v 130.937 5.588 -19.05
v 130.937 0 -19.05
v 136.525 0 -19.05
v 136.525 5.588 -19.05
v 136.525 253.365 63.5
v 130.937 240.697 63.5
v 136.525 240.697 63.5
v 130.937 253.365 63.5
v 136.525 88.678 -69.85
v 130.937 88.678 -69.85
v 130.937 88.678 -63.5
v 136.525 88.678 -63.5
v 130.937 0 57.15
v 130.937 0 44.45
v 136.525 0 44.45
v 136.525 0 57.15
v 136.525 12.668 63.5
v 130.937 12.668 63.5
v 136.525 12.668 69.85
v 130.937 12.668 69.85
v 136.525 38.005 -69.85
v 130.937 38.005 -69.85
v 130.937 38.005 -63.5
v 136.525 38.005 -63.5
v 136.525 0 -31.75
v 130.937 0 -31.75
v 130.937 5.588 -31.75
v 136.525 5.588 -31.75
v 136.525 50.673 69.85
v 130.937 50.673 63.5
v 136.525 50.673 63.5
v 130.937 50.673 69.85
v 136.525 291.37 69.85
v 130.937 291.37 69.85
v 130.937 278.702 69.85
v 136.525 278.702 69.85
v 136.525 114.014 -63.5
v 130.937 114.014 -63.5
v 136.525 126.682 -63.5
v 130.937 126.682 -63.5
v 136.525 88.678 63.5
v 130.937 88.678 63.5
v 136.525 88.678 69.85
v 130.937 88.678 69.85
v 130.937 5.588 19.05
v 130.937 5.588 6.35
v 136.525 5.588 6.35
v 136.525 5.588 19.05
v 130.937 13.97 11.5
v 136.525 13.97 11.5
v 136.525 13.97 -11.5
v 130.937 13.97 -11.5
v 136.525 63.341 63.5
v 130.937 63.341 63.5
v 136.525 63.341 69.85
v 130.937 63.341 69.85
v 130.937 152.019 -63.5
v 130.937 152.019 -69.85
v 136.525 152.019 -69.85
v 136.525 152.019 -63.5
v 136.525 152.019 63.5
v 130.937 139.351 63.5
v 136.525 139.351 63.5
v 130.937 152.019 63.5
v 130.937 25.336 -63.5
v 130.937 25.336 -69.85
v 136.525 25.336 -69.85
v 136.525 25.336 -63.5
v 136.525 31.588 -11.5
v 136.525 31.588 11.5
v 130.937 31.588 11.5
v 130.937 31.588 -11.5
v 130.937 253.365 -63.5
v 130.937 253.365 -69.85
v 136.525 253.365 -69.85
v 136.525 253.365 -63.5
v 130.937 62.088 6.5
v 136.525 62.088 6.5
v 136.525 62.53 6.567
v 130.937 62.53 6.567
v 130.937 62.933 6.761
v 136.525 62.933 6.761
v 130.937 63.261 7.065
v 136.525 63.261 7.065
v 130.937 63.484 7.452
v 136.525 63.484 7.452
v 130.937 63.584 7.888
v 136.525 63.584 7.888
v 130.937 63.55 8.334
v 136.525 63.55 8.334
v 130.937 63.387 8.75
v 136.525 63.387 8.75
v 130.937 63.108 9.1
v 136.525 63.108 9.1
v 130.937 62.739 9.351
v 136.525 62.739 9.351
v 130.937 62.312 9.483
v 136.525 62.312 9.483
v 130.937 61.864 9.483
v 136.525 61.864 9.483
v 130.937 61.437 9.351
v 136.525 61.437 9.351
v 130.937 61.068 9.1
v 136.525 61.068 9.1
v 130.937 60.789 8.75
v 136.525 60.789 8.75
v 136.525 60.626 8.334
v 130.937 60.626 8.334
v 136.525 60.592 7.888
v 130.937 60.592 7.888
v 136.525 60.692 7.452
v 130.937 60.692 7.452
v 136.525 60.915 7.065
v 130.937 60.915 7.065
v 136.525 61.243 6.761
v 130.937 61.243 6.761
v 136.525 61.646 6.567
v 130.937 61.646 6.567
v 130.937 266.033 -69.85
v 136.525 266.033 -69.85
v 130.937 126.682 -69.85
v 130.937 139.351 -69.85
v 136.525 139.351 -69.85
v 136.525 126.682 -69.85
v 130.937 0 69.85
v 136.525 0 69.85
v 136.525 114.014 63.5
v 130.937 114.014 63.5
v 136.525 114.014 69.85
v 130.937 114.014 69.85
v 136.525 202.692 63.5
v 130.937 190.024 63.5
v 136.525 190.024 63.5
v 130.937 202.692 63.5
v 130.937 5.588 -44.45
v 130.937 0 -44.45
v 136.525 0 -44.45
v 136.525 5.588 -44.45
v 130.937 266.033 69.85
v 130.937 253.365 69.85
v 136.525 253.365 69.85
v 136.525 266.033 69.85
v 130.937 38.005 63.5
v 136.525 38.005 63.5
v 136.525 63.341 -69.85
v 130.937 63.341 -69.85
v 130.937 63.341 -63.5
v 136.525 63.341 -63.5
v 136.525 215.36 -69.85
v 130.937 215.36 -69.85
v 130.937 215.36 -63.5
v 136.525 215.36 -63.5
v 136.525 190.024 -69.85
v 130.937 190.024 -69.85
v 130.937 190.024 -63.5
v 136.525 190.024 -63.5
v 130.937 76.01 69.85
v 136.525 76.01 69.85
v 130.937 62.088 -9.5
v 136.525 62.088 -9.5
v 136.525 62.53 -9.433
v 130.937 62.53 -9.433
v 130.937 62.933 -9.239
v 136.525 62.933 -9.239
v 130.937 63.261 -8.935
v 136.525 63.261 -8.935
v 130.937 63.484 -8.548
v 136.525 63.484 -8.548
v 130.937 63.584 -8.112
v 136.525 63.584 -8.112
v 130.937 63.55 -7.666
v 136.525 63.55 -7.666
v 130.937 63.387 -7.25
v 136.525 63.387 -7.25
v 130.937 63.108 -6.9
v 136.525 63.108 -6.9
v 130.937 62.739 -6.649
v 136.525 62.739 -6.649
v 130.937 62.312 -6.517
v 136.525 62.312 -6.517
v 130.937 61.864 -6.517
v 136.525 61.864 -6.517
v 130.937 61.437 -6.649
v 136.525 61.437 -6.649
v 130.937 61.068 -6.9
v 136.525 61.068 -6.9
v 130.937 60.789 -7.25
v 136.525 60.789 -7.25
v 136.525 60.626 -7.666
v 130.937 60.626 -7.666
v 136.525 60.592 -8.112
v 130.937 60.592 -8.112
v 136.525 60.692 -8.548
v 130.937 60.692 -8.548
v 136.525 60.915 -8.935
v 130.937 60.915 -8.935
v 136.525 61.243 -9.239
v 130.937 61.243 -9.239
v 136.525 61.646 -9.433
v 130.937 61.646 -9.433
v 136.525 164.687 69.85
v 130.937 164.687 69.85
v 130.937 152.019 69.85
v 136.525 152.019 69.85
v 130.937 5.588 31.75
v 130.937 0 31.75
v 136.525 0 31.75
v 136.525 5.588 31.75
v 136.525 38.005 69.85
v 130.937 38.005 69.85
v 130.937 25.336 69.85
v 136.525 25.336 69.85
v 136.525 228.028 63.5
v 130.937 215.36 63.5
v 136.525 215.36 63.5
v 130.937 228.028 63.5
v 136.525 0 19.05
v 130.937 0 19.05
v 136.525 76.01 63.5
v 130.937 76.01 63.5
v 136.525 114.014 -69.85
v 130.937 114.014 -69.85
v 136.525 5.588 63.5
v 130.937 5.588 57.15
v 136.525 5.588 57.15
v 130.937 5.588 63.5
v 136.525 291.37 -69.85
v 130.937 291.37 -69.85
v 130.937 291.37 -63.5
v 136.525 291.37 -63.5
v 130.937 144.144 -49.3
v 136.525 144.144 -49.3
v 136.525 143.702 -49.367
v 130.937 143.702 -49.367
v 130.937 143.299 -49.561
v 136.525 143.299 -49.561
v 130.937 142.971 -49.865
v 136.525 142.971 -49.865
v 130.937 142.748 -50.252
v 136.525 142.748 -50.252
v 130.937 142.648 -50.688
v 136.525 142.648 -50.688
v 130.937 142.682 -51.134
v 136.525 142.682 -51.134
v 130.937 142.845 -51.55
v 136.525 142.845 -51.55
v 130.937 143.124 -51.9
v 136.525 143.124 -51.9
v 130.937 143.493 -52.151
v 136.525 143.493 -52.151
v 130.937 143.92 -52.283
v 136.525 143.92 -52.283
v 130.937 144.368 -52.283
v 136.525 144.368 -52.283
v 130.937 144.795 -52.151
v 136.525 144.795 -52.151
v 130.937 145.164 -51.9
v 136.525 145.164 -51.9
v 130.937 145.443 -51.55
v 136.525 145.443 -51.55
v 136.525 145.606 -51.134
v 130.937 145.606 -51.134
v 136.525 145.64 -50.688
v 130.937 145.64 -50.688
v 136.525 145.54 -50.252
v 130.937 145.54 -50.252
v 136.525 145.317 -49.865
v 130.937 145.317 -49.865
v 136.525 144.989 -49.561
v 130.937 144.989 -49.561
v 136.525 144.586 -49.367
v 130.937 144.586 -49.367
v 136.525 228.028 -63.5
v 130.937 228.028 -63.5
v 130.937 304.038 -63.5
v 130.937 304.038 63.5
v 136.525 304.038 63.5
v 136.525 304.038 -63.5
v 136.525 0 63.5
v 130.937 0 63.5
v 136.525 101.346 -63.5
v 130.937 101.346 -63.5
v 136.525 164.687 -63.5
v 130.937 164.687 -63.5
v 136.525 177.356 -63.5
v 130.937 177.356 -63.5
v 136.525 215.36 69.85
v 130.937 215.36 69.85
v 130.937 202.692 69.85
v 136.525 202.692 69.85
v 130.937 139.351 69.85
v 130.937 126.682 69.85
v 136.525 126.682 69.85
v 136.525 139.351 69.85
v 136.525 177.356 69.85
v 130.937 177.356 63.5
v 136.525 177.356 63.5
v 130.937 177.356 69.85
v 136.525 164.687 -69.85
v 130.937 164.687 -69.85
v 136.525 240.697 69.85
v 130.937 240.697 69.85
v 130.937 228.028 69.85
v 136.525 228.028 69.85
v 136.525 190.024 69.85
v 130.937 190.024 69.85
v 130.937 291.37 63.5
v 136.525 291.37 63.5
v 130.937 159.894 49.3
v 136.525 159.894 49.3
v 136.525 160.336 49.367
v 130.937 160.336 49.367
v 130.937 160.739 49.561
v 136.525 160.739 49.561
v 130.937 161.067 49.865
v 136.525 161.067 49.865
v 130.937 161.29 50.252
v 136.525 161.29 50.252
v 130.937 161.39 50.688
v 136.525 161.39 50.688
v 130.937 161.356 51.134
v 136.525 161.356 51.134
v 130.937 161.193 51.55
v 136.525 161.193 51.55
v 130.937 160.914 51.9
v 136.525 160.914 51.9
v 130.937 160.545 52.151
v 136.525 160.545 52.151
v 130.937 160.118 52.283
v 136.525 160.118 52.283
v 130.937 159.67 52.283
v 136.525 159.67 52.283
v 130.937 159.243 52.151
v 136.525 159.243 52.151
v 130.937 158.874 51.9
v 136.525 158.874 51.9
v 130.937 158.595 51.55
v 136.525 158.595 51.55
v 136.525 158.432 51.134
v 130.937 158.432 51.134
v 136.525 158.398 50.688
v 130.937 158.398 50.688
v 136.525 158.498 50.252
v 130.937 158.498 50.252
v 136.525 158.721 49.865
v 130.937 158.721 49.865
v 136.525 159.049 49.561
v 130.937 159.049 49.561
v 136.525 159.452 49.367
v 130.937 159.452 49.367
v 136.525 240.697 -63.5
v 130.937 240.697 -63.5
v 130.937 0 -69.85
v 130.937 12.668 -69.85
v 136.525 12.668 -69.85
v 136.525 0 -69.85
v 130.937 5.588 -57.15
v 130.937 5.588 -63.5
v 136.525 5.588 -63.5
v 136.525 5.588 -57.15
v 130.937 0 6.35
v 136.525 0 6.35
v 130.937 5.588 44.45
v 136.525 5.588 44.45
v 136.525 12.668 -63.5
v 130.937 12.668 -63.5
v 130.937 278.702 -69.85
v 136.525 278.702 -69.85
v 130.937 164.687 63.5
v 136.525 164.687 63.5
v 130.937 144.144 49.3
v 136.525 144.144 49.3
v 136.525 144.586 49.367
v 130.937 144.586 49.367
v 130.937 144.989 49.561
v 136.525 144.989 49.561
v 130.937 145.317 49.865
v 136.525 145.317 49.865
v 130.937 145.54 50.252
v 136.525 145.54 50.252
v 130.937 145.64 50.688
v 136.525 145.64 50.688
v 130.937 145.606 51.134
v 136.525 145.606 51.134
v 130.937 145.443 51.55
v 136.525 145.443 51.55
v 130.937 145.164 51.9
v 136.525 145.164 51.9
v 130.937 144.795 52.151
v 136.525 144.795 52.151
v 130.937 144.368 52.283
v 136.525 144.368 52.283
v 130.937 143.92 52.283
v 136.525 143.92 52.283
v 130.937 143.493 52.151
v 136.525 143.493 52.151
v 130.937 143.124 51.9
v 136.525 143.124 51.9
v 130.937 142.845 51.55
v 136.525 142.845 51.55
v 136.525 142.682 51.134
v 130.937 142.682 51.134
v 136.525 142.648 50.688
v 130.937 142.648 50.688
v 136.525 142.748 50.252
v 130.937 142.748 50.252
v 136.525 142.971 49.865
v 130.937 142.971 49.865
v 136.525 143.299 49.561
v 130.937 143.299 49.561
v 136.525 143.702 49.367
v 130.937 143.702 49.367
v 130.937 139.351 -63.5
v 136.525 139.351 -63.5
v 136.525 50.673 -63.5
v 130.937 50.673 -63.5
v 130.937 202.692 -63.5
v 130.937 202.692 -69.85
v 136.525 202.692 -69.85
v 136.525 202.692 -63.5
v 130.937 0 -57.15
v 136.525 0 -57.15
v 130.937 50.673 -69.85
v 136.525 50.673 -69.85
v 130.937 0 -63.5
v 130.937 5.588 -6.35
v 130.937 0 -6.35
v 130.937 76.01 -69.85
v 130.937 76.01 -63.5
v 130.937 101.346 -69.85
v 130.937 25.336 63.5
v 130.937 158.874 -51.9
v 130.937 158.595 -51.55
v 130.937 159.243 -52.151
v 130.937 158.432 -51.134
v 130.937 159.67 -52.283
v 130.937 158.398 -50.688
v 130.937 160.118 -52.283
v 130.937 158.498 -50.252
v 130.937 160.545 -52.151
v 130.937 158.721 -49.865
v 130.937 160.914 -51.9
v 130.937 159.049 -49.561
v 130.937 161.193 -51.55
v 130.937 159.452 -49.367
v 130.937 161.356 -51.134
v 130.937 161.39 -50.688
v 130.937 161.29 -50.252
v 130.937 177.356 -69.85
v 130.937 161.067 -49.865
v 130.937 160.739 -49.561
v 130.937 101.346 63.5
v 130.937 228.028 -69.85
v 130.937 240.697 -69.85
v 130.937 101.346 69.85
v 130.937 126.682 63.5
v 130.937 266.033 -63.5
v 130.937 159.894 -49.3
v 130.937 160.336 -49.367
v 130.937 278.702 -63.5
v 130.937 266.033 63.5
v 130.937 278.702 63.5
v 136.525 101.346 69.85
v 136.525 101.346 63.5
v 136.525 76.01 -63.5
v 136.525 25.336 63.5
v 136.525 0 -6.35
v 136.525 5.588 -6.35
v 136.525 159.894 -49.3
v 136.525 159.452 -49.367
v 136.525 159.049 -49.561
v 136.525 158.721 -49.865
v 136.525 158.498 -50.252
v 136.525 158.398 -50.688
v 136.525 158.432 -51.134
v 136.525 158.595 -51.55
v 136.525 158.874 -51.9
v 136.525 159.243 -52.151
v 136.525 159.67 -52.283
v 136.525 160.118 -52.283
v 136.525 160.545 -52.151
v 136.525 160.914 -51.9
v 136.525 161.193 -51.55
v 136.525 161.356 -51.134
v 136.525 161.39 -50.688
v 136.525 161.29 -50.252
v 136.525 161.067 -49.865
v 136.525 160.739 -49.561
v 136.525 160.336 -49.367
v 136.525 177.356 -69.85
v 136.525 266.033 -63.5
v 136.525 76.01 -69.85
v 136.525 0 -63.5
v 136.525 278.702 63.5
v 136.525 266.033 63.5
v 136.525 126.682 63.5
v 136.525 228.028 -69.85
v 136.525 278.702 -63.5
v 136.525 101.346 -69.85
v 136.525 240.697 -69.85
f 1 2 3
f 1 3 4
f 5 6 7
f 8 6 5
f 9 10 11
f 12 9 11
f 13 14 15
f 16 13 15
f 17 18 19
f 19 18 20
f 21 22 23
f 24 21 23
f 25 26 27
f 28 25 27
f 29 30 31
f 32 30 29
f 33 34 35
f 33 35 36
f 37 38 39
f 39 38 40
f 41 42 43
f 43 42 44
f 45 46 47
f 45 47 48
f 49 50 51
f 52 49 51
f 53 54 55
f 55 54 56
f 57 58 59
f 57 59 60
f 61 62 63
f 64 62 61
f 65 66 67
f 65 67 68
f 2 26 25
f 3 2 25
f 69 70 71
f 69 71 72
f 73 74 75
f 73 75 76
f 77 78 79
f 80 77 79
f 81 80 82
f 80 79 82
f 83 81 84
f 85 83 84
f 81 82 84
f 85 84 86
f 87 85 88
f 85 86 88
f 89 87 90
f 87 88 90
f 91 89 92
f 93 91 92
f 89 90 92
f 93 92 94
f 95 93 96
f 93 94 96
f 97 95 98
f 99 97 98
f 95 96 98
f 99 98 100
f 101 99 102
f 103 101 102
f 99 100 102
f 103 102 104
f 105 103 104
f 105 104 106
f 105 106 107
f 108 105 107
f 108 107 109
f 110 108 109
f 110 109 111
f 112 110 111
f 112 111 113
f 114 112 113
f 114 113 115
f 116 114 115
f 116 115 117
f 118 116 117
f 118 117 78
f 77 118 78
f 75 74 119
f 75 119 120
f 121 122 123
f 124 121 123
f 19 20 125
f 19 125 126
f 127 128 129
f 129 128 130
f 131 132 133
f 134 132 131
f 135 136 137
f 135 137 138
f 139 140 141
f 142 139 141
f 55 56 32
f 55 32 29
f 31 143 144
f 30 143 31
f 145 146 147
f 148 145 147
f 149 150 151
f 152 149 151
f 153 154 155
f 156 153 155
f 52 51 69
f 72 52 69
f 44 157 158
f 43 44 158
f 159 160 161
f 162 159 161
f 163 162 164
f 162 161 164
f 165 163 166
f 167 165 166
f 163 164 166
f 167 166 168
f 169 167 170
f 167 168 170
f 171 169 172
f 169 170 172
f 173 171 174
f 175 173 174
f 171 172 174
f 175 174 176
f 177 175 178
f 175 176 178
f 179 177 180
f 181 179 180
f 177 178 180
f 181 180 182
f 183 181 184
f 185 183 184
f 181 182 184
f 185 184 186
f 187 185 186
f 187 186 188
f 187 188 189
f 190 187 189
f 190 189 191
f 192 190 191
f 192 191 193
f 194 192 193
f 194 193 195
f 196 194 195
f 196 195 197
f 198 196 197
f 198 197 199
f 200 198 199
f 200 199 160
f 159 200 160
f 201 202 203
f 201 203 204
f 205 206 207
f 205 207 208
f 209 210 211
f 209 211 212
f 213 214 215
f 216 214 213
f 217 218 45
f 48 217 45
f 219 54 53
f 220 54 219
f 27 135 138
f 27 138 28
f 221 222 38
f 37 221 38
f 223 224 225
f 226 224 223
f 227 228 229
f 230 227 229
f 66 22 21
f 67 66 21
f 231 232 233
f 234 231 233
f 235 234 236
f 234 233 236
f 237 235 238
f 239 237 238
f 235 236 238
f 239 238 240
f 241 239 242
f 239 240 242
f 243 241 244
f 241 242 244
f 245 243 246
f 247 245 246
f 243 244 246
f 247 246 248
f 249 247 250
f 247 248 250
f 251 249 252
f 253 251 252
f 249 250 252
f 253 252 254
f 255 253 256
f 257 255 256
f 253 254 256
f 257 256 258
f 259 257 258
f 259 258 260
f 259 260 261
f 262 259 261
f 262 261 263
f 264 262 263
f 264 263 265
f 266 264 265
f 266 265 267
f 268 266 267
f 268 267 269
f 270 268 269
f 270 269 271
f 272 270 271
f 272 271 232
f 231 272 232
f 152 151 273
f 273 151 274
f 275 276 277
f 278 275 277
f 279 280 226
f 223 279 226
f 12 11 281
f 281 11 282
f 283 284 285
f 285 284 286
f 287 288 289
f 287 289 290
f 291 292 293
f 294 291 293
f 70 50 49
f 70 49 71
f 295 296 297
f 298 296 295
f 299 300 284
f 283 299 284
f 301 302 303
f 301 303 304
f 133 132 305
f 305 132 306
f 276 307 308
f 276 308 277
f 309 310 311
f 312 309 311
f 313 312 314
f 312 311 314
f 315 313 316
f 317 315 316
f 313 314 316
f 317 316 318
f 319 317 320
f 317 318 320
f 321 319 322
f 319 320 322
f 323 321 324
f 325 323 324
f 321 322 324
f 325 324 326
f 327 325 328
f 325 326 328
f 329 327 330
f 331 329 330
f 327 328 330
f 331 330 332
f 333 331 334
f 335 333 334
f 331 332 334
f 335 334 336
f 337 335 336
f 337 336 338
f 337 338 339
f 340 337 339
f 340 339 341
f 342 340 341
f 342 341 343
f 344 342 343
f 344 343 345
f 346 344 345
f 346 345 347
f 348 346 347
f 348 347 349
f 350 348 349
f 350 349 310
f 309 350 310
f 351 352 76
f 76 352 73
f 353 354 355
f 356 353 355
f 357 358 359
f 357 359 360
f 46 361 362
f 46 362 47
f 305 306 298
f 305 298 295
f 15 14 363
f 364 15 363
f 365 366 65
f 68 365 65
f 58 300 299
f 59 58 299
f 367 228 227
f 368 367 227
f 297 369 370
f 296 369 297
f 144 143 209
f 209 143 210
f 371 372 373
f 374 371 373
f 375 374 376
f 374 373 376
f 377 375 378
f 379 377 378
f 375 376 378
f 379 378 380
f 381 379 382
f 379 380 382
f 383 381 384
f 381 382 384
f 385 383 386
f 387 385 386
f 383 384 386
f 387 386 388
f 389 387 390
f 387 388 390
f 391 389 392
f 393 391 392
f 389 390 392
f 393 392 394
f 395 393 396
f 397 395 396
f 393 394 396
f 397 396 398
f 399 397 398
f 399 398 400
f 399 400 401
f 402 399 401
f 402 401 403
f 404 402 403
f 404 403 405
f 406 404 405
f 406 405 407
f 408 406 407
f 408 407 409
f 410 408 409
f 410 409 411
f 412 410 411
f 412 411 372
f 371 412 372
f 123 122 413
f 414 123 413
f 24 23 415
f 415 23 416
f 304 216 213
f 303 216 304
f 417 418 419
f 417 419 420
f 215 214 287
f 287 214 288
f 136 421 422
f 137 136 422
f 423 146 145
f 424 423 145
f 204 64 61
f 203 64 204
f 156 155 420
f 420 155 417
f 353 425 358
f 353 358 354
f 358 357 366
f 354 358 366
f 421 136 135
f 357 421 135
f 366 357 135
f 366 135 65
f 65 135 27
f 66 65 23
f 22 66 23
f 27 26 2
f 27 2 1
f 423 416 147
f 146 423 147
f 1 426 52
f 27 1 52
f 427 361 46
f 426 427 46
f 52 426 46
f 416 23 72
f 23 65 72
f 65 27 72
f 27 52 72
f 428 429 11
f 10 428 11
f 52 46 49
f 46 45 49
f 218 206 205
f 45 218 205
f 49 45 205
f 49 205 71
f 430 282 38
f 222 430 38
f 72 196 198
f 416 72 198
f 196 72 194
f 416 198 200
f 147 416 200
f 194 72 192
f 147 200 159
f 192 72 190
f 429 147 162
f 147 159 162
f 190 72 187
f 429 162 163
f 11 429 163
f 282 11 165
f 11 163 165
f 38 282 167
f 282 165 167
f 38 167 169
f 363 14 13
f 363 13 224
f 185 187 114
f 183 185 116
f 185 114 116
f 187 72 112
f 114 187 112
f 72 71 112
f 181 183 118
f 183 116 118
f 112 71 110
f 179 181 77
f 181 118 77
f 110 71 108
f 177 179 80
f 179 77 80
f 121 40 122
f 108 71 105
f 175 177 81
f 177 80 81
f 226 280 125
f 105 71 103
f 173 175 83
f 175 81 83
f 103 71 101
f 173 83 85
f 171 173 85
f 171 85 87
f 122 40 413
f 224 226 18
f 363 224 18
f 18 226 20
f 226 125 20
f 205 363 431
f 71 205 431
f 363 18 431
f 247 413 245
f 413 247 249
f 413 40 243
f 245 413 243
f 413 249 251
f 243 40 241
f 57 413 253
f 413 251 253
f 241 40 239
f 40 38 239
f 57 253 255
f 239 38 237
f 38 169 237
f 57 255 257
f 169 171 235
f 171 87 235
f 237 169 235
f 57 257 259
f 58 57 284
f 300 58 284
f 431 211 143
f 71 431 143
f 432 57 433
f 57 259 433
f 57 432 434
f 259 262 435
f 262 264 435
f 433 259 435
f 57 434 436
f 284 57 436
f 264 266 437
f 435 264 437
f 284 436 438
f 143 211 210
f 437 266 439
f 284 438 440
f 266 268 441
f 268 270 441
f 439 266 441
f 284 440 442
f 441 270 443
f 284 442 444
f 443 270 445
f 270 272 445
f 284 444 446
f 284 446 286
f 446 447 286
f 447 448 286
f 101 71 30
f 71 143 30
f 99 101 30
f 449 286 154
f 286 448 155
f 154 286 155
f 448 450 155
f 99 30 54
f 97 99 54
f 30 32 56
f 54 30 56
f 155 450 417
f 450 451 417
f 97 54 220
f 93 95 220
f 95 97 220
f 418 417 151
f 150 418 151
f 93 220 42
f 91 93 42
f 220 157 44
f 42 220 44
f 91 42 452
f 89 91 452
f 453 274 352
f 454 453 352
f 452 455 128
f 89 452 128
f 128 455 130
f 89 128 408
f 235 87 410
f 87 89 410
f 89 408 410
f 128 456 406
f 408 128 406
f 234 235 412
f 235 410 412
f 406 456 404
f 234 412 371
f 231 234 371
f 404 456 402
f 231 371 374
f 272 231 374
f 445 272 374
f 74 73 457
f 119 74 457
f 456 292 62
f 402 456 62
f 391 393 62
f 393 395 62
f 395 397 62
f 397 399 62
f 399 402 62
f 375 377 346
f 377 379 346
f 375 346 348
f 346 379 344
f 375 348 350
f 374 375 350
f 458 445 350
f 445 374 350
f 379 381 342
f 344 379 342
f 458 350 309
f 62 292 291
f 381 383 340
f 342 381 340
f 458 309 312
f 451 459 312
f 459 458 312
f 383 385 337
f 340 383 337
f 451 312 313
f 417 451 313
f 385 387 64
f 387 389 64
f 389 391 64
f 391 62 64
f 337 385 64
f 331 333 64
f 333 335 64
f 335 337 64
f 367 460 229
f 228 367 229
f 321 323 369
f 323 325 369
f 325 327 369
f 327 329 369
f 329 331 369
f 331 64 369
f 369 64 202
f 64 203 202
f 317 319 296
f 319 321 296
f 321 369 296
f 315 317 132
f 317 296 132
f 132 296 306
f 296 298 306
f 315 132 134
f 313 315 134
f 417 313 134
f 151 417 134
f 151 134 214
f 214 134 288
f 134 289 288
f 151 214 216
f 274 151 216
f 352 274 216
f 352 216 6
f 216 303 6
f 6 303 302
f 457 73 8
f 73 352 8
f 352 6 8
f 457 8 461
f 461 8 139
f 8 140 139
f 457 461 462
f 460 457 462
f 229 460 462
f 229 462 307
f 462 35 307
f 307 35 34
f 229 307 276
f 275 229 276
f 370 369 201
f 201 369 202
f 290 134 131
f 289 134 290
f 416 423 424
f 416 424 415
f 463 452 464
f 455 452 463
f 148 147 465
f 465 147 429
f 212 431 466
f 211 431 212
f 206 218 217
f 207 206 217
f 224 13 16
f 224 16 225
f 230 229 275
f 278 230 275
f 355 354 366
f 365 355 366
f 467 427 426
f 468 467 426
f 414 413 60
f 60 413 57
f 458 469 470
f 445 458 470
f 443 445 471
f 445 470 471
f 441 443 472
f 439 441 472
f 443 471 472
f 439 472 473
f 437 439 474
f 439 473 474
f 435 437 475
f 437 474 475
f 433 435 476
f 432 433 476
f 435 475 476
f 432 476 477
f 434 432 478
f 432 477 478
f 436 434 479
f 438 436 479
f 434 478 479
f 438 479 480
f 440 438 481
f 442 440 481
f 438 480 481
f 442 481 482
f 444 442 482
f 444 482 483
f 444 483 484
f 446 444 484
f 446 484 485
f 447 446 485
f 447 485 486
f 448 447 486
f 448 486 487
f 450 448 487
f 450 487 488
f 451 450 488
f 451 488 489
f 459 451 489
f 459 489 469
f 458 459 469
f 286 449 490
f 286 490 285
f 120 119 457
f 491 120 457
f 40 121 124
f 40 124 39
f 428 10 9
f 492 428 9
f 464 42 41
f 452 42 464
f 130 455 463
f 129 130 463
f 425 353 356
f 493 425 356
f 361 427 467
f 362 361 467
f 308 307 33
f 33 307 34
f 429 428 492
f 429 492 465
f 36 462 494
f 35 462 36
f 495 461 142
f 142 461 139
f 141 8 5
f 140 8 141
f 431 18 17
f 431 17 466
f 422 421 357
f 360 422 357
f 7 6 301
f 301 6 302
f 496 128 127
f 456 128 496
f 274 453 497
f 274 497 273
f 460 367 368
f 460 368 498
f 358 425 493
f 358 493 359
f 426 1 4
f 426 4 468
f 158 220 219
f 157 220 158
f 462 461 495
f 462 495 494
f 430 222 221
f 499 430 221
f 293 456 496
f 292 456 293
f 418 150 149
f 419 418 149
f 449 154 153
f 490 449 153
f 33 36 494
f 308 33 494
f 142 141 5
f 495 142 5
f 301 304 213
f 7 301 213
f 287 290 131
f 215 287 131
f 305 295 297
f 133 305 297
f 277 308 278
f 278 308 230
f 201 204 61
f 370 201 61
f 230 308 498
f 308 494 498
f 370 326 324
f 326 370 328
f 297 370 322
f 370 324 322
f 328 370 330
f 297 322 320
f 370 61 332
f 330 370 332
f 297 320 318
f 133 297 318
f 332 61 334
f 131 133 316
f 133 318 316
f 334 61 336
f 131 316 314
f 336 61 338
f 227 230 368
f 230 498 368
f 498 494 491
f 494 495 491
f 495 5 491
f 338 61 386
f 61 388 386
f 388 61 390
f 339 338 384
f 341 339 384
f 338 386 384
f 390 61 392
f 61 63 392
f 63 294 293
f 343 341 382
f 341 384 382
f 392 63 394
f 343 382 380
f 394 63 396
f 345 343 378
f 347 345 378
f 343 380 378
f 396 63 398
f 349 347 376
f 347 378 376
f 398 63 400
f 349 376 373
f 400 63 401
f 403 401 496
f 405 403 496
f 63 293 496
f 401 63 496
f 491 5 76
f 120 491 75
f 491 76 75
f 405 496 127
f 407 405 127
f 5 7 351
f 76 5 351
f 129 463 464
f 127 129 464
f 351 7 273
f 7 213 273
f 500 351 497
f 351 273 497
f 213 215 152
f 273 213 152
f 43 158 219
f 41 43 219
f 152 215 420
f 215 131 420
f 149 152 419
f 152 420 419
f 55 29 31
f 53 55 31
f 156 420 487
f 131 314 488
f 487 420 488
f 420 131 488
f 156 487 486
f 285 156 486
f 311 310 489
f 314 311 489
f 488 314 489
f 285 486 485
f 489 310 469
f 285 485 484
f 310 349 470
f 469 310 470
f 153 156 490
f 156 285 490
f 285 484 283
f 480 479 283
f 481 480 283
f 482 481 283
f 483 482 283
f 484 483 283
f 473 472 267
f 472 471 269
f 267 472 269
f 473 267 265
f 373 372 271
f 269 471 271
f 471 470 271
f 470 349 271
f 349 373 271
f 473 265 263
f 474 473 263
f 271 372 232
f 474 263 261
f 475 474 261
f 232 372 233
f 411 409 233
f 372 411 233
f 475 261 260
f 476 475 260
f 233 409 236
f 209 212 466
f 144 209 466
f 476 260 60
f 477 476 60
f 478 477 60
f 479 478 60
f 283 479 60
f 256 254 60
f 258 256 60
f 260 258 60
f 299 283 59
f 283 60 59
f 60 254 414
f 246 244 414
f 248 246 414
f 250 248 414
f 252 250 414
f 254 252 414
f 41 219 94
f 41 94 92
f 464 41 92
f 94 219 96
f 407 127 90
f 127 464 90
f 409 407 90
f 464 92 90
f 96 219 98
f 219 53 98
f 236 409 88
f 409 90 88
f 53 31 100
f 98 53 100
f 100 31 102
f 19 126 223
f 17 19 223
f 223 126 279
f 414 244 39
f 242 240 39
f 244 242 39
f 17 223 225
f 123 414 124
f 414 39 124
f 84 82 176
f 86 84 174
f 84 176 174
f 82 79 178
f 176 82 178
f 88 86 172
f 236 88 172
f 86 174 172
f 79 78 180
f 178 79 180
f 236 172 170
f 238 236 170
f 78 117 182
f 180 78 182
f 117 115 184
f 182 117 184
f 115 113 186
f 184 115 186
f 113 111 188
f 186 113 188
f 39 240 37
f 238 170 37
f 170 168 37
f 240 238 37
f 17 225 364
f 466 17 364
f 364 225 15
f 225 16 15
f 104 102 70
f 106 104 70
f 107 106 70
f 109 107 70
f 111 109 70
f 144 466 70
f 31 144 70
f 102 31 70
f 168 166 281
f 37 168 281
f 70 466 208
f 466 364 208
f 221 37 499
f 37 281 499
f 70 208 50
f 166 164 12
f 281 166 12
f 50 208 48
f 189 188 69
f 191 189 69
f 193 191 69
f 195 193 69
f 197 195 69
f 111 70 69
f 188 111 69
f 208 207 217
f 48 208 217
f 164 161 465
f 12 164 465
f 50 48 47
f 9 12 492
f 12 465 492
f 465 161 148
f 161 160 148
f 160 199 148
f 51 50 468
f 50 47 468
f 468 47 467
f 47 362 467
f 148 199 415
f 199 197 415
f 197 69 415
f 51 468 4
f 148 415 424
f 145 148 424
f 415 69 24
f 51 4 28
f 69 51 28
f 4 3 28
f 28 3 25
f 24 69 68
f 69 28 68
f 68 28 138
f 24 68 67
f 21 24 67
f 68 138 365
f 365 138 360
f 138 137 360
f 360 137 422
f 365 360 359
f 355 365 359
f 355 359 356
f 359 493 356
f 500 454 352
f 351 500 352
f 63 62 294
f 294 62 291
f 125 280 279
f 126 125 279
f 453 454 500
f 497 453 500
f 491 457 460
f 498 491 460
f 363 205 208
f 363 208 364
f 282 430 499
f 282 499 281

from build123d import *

# Parameters (mm, degrees)
SKETCH1_W              = 273.05
SKETCH1_H              = 139.7
BOSS_EXTRUDE1_DEPTH    = 5.588
SKETCH2_W              = 273.05
SKETCH2_H              = 139.7
SKETCH2_W_2            = 261.874
SKETCH2_H_2            = 128.524
BOSS_EXTRUDE2_DEPTH    = 298.45
SKETCH3_W              = 6.35
SKETCH3_H              = 16.933333333
SKETCH3_H_2            = 16.933333334
DOOR_SLOT_DEPTH        = 12.7
DOOR_GUIDE_HOLES_REACH = 361.255
SKETCH4_W              = 6.35
SKETCH4_H              = 15.875
LEVER_HOLES_W          = 9.652
LEVER_HOLES_H          = 6.35
LEVER_HOLES_W_2        = 6.35
CUT_EXTRUDE1_DEPTH     = 362.378293578
CUT_EXTRUDE3_REACH     = 416.577
SKETCH8_R              = 3.175
SKETCH16_W             = 327.238778096
SKETCH16_H             = 314.471565403
CUT_EXTRUDE10_DEPTH    = 362.378293578
LEFT_RIGHT_W           = 6.35
LEFT_RIGHT_H           = 5.588
LEFT_RIGHT_W_2         = 12.7
LEFT_RIGHT_H_2         = 12.66825
CUT_EXTRUDE11_DEPTH    = 415.577411883
SKETCH17_R             = 1.5
SKETCH17_W             = 23
SKETCH17_H             = 17.61800007
CUT_EXTRUDE12_DEPTH    = 313.00857951


with BuildPart() as part:
    # Sketch1 → Boss-Extrude1 (new body)
    with BuildSketch(Plane(origin=(0, 0, 0), x_dir=(1, 0, 0), z_dir=(0, 1, 0))):
        Rectangle(SKETCH1_W, SKETCH1_H)
    extrude(amount=BOSS_EXTRUDE1_DEPTH)

    # Sketch2 → Boss-Extrude2 (add)
    with BuildSketch(Plane(origin=(0, 5.588, 0), x_dir=(1, 0, 0), z_dir=(0, 1, 0))):
        Rectangle(SKETCH2_W, SKETCH2_H)
        Rectangle(SKETCH2_W_2, SKETCH2_H_2, mode=Mode.SUBTRACT)
    extrude(amount=BOSS_EXTRUDE2_DEPTH)

    # Sketch3 → Door Slot (cut)
    with BuildSketch(Plane.XY.offset(69.85)):
        with BuildLine():
            Line((-29.337, 282.448), (-29.337, 5.588))
            Line((-29.337, 5.588), (-22.733, 5.588))
            Line((-22.733, 5.588), (-22.733, 291.592))
            Line((-22.733, 291.592), (-42.291, 291.592))
            Line((-42.291, 291.592), (-42.291, 284.988))
            Line((-42.291, 284.988), (-31.877, 284.988))
            ThreePointArc((-31.877, 284.988), (-30.080948776, 284.244051224), (-29.337, 282.448))
        make_face()
        with Locations((-13.208, 80.433333334)):
            Rectangle(SKETCH3_W, SKETCH3_H)
        with Locations((-13.208, 50.8)):
            Rectangle(SKETCH3_W, SKETCH3_H_2)
        with Locations((-13.208, 21.166666667)):
            Rectangle(SKETCH3_W, SKETCH3_H)
    extrude(amount=-DOOR_SLOT_DEPTH, mode=Mode.SUBTRACT)

    # Sketch4 → Door Guide Holes (cut, up to next)
    with BuildSketch(Plane.XY.offset(-64.262), mode=Mode.PRIVATE) as door_guide_holes_sk1:
        with Locations((-45.466, 283.4005)):
            Rectangle(SKETCH4_W, SKETCH4_H)
    door_guide_holes_tool1 = extrude(door_guide_holes_sk1.sketch, amount=-DOOR_GUIDE_HOLES_REACH, mode=Mode.PRIVATE) & part.part
    # Sketch4 → Door Guide Holes (cut, up to next)
    with BuildSketch(Plane.XY.offset(-64.262), mode=Mode.PRIVATE) as door_guide_holes_sk2:
        with Locations((-45.466, 254.8255)):
            Rectangle(SKETCH4_W, SKETCH4_H)
    door_guide_holes_tool2 = extrude(door_guide_holes_sk2.sketch, amount=-DOOR_GUIDE_HOLES_REACH, mode=Mode.PRIVATE) & part.part
    # Sketch4 → Door Guide Holes (cut, up to next)
    with BuildSketch(Plane.XY.offset(-64.262), mode=Mode.PRIVATE) as door_guide_holes_sk3:
        with Locations((-45.466, 226.2505)):
            Rectangle(SKETCH4_W, SKETCH4_H)
    door_guide_holes_tool3 = extrude(door_guide_holes_sk3.sketch, amount=-DOOR_GUIDE_HOLES_REACH, mode=Mode.PRIVATE) & part.part
    # Sketch4 → Door Guide Holes (cut, up to next)
    with BuildSketch(Plane.XY.offset(-64.262), mode=Mode.PRIVATE) as door_guide_holes_sk4:
        with Locations((-45.466, 197.6755)):
            Rectangle(SKETCH4_W, SKETCH4_H)
    door_guide_holes_tool4 = extrude(door_guide_holes_sk4.sketch, amount=-DOOR_GUIDE_HOLES_REACH, mode=Mode.PRIVATE) & part.part
    # Sketch4 → Door Guide Holes (cut, up to next)
    with BuildSketch(Plane.XY.offset(-64.262), mode=Mode.PRIVATE) as door_guide_holes_sk5:
        with Locations((-45.466, 169.1005)):
            Rectangle(SKETCH4_W, SKETCH4_H)
    door_guide_holes_tool5 = extrude(door_guide_holes_sk5.sketch, amount=-DOOR_GUIDE_HOLES_REACH, mode=Mode.PRIVATE) & part.part
    # Sketch4 → Door Guide Holes (cut, up to next)
    with BuildSketch(Plane.XY.offset(-64.262), mode=Mode.PRIVATE) as door_guide_holes_sk6:
        with Locations((-45.466, 140.5255)):
            Rectangle(SKETCH4_W, SKETCH4_H)
    door_guide_holes_tool6 = extrude(door_guide_holes_sk6.sketch, amount=-DOOR_GUIDE_HOLES_REACH, mode=Mode.PRIVATE) & part.part
    # Sketch4 → Door Guide Holes (cut, up to next)
    with BuildSketch(Plane.XY.offset(-64.262), mode=Mode.PRIVATE) as door_guide_holes_sk7:
        with Locations((-45.466, 111.9505)):
            Rectangle(SKETCH4_W, SKETCH4_H)
    door_guide_holes_tool7 = extrude(door_guide_holes_sk7.sketch, amount=-DOOR_GUIDE_HOLES_REACH, mode=Mode.PRIVATE) & part.part
    # Sketch4 → Door Guide Holes (cut, up to next)
    with BuildSketch(Plane.XY.offset(-64.262), mode=Mode.PRIVATE) as door_guide_holes_sk8:
        with Locations((-45.466, 83.3755)):
            Rectangle(SKETCH4_W, SKETCH4_H)
    door_guide_holes_tool8 = extrude(door_guide_holes_sk8.sketch, amount=-DOOR_GUIDE_HOLES_REACH, mode=Mode.PRIVATE) & part.part
    # Sketch4 → Door Guide Holes (cut, up to next)
    with BuildSketch(Plane.XY.offset(-64.262), mode=Mode.PRIVATE) as door_guide_holes_sk9:
        with Locations((-45.466, 54.8005)):
            Rectangle(SKETCH4_W, SKETCH4_H)
    door_guide_holes_tool9 = extrude(door_guide_holes_sk9.sketch, amount=-DOOR_GUIDE_HOLES_REACH, mode=Mode.PRIVATE) & part.part
    # Sketch4 → Door Guide Holes (cut, up to next)
    with BuildSketch(Plane.XY.offset(-64.262), mode=Mode.PRIVATE) as door_guide_holes_sk10:
        with Locations((-45.466, 26.2255)):
            Rectangle(SKETCH4_W, SKETCH4_H)
    door_guide_holes_tool10 = extrude(door_guide_holes_sk10.sketch, amount=-DOOR_GUIDE_HOLES_REACH, mode=Mode.PRIVATE) & part.part
    door_guide_holes_1 = door_guide_holes_tool1.solids().sort_by_distance((-45.466, 283.4005, -64.262))[0]
    add(door_guide_holes_1, mode=Mode.SUBTRACT)
    door_guide_holes_2 = door_guide_holes_tool2.solids().sort_by_distance((-45.466, 254.8255, -64.262))[0]
    add(door_guide_holes_2, mode=Mode.SUBTRACT)
    door_guide_holes_3 = door_guide_holes_tool3.solids().sort_by_distance((-45.466, 226.2505, -64.262))[0]
    add(door_guide_holes_3, mode=Mode.SUBTRACT)
    door_guide_holes_4 = door_guide_holes_tool4.solids().sort_by_distance((-45.466, 197.6755, -64.262))[0]
    add(door_guide_holes_4, mode=Mode.SUBTRACT)
    door_guide_holes_5 = door_guide_holes_tool5.solids().sort_by_distance((-45.466, 169.1005, -64.262))[0]
    add(door_guide_holes_5, mode=Mode.SUBTRACT)
    door_guide_holes_6 = door_guide_holes_tool6.solids().sort_by_distance((-45.466, 140.5255, -64.262))[0]
    add(door_guide_holes_6, mode=Mode.SUBTRACT)
    door_guide_holes_7 = door_guide_holes_tool7.solids().sort_by_distance((-45.466, 111.9505, -64.262))[0]
    add(door_guide_holes_7, mode=Mode.SUBTRACT)
    door_guide_holes_8 = door_guide_holes_tool8.solids().sort_by_distance((-45.466, 83.3755, -64.262))[0]
    add(door_guide_holes_8, mode=Mode.SUBTRACT)
    door_guide_holes_9 = door_guide_holes_tool9.solids().sort_by_distance((-45.466, 54.8005, -64.262))[0]
    add(door_guide_holes_9, mode=Mode.SUBTRACT)
    door_guide_holes_10 = door_guide_holes_tool10.solids().sort_by_distance((-45.466, 26.2255, -64.262))[0]
    add(door_guide_holes_10, mode=Mode.SUBTRACT)
    door_guide_holes = door_guide_holes_1 + door_guide_holes_2 + door_guide_holes_3 + door_guide_holes_4 + door_guide_holes_5 + door_guide_holes_6 + door_guide_holes_7 + door_guide_holes_8 + door_guide_holes_9 + door_guide_holes_10  # Door Guide Holes as one shape, for the pattern or mirror that repeats it

    # Mirror1: Door Guide Holes across plane
    add(door_guide_holes.mirror(Plane.ZY.offset(32.512)), mode=Mode.SUBTRACT)

    # Lever Holes → Cut-Extrude1 (cut, through all)
    with BuildSketch(Plane.XY.offset(69.85)):
        with Locations((54.102, 28.575)):
            Rectangle(LEVER_HOLES_W, LEVER_HOLES_H)
        with Locations((39.3065, 15.875)):
            Rectangle(LEVER_HOLES_W_2, LEVER_HOLES_H)
        with Locations((68.8975, 15.875)):
            Rectangle(LEVER_HOLES_W_2, LEVER_HOLES_H)
    extrude(amount=-CUT_EXTRUDE1_DEPTH, mode=Mode.SUBTRACT)

    # Sketch8 → Cut-Extrude3 (cut, up to next)
    with BuildSketch(Plane.ZY.offset(136.525), mode=Mode.PRIVATE) as cut_extrude3_sk1:
        with Locations((0, 19.05)):
            Circle(SKETCH8_R)
    cut_extrude3_tool1 = extrude(cut_extrude3_sk1.sketch, amount=-CUT_EXTRUDE3_REACH, mode=Mode.PRIVATE) & part.part
    add(cut_extrude3_tool1.solids().sort_by_distance((-136.525, 19.05, 0))[0], mode=Mode.SUBTRACT)

    # Sketch16 → Cut-Extrude10 (cut, through all)
    with BuildSketch(Plane.XY.offset(69.85)):
        with Locations((-32.682389048, 146.802217299)):
            Rectangle(SKETCH16_W, SKETCH16_H)
    extrude(amount=-CUT_EXTRUDE10_DEPTH, mode=Mode.SUBTRACT)

    # Left/Right → Cut-Extrude11 (cut, through all)
    with BuildSketch(Plane.ZY.offset(136.525)):
        with Locations((60.325, 2.794)):
            Rectangle(LEFT_RIGHT_W, LEFT_RIGHT_H)
        with Locations((38.1, 2.794)):
            Rectangle(LEFT_RIGHT_W_2, LEFT_RIGHT_H)
        with Locations((66.675, 19.002375)):
            Rectangle(LEFT_RIGHT_W, LEFT_RIGHT_H_2)
        with Locations((12.7, 2.794)):
            Rectangle(LEFT_RIGHT_W_2, LEFT_RIGHT_H)
        with Locations((66.675, 44.338875)):
            Rectangle(LEFT_RIGHT_W, LEFT_RIGHT_H_2)
        with Locations((-12.7, 2.794)):
            Rectangle(LEFT_RIGHT_W_2, LEFT_RIGHT_H)
        with Locations((66.675, 69.675375)):
            Rectangle(LEFT_RIGHT_W, LEFT_RIGHT_H_2)
        with Locations((-38.1, 2.794)):
            Rectangle(LEFT_RIGHT_W_2, LEFT_RIGHT_H)
        with Locations((66.675, 95.011875)):
            Rectangle(LEFT_RIGHT_W, LEFT_RIGHT_H_2)
        with Locations((-60.325, 2.794)):
            Rectangle(LEFT_RIGHT_W, LEFT_RIGHT_H)
        with Locations((66.675, 120.348375)):
            Rectangle(LEFT_RIGHT_W, LEFT_RIGHT_H_2)
        with Locations((-66.675, 19.002375)):
            Rectangle(LEFT_RIGHT_W, LEFT_RIGHT_H_2)
        with Locations((66.675, 145.684875)):
            Rectangle(LEFT_RIGHT_W, LEFT_RIGHT_H_2)
        with Locations((-66.675, 44.338875)):
            Rectangle(LEFT_RIGHT_W, LEFT_RIGHT_H_2)
        with Locations((66.675, 171.021375)):
            Rectangle(LEFT_RIGHT_W, LEFT_RIGHT_H_2)
        with Locations((-66.675, 69.675375)):
            Rectangle(LEFT_RIGHT_W, LEFT_RIGHT_H_2)
        with Locations((66.675, 196.357875)):
            Rectangle(LEFT_RIGHT_W, LEFT_RIGHT_H_2)
        with Locations((-66.675, 95.011875)):
            Rectangle(LEFT_RIGHT_W, LEFT_RIGHT_H_2)
        with Locations((66.675, 221.694375)):
            Rectangle(LEFT_RIGHT_W, LEFT_RIGHT_H_2)
        with Locations((-66.675, 120.348375)):
            Rectangle(LEFT_RIGHT_W, LEFT_RIGHT_H_2)
        with Locations((66.675, 247.030875)):
            Rectangle(LEFT_RIGHT_W, LEFT_RIGHT_H_2)
        with Locations((-66.675, 145.684875)):
            Rectangle(LEFT_RIGHT_W, LEFT_RIGHT_H_2)
        with Locations((66.675, 272.367375)):
            Rectangle(LEFT_RIGHT_W, LEFT_RIGHT_H_2)
        with Locations((-66.675, 171.021375)):
            Rectangle(LEFT_RIGHT_W, LEFT_RIGHT_H_2)
        with Locations((66.675, 297.703875)):
            Rectangle(LEFT_RIGHT_W, LEFT_RIGHT_H_2)
        with Locations((-66.675, 196.357875)):
            Rectangle(LEFT_RIGHT_W, LEFT_RIGHT_H_2)
        with Locations((-66.675, 221.694375)):
            Rectangle(LEFT_RIGHT_W, LEFT_RIGHT_H_2)
        with Locations((-66.675, 247.030875)):
            Rectangle(LEFT_RIGHT_W, LEFT_RIGHT_H_2)
        with Locations((-66.675, 272.367375)):
            Rectangle(LEFT_RIGHT_W, LEFT_RIGHT_H_2)
        with Locations((-66.675, 297.703875)):
            Rectangle(LEFT_RIGHT_W, LEFT_RIGHT_H_2)
    extrude(amount=-CUT_EXTRUDE11_DEPTH, mode=Mode.SUBTRACT)

    # Sketch17 → Cut-Extrude12 (cut, through all)
    with BuildSketch(Plane(origin=(136.525, 0, 0), x_dir=(0, 0, -1), z_dir=(1, 0, 0))):
        with Locations((-8, 62.088)):
            Circle(SKETCH17_R)
        with Locations((8, 62.088)):
            Circle(SKETCH17_R)
        with Locations((-50.8, 159.894)):
            Circle(SKETCH17_R)
        with Locations((-50.8, 144.144)):
            Circle(SKETCH17_R)
        with Locations(Location((50.8, 144.144, 0), (0, 0, 180))):
            Circle(SKETCH17_R)
        with Locations(Location((50.8, 159.894, 0), (0, 0, 180))):
            Circle(SKETCH17_R)
        with Locations((0, 22.779000035)):
            Rectangle(SKETCH17_W, SKETCH17_H)
    extrude(amount=-CUT_EXTRUDE12_DEPTH, mode=Mode.SUBTRACT)


solid = part.part
